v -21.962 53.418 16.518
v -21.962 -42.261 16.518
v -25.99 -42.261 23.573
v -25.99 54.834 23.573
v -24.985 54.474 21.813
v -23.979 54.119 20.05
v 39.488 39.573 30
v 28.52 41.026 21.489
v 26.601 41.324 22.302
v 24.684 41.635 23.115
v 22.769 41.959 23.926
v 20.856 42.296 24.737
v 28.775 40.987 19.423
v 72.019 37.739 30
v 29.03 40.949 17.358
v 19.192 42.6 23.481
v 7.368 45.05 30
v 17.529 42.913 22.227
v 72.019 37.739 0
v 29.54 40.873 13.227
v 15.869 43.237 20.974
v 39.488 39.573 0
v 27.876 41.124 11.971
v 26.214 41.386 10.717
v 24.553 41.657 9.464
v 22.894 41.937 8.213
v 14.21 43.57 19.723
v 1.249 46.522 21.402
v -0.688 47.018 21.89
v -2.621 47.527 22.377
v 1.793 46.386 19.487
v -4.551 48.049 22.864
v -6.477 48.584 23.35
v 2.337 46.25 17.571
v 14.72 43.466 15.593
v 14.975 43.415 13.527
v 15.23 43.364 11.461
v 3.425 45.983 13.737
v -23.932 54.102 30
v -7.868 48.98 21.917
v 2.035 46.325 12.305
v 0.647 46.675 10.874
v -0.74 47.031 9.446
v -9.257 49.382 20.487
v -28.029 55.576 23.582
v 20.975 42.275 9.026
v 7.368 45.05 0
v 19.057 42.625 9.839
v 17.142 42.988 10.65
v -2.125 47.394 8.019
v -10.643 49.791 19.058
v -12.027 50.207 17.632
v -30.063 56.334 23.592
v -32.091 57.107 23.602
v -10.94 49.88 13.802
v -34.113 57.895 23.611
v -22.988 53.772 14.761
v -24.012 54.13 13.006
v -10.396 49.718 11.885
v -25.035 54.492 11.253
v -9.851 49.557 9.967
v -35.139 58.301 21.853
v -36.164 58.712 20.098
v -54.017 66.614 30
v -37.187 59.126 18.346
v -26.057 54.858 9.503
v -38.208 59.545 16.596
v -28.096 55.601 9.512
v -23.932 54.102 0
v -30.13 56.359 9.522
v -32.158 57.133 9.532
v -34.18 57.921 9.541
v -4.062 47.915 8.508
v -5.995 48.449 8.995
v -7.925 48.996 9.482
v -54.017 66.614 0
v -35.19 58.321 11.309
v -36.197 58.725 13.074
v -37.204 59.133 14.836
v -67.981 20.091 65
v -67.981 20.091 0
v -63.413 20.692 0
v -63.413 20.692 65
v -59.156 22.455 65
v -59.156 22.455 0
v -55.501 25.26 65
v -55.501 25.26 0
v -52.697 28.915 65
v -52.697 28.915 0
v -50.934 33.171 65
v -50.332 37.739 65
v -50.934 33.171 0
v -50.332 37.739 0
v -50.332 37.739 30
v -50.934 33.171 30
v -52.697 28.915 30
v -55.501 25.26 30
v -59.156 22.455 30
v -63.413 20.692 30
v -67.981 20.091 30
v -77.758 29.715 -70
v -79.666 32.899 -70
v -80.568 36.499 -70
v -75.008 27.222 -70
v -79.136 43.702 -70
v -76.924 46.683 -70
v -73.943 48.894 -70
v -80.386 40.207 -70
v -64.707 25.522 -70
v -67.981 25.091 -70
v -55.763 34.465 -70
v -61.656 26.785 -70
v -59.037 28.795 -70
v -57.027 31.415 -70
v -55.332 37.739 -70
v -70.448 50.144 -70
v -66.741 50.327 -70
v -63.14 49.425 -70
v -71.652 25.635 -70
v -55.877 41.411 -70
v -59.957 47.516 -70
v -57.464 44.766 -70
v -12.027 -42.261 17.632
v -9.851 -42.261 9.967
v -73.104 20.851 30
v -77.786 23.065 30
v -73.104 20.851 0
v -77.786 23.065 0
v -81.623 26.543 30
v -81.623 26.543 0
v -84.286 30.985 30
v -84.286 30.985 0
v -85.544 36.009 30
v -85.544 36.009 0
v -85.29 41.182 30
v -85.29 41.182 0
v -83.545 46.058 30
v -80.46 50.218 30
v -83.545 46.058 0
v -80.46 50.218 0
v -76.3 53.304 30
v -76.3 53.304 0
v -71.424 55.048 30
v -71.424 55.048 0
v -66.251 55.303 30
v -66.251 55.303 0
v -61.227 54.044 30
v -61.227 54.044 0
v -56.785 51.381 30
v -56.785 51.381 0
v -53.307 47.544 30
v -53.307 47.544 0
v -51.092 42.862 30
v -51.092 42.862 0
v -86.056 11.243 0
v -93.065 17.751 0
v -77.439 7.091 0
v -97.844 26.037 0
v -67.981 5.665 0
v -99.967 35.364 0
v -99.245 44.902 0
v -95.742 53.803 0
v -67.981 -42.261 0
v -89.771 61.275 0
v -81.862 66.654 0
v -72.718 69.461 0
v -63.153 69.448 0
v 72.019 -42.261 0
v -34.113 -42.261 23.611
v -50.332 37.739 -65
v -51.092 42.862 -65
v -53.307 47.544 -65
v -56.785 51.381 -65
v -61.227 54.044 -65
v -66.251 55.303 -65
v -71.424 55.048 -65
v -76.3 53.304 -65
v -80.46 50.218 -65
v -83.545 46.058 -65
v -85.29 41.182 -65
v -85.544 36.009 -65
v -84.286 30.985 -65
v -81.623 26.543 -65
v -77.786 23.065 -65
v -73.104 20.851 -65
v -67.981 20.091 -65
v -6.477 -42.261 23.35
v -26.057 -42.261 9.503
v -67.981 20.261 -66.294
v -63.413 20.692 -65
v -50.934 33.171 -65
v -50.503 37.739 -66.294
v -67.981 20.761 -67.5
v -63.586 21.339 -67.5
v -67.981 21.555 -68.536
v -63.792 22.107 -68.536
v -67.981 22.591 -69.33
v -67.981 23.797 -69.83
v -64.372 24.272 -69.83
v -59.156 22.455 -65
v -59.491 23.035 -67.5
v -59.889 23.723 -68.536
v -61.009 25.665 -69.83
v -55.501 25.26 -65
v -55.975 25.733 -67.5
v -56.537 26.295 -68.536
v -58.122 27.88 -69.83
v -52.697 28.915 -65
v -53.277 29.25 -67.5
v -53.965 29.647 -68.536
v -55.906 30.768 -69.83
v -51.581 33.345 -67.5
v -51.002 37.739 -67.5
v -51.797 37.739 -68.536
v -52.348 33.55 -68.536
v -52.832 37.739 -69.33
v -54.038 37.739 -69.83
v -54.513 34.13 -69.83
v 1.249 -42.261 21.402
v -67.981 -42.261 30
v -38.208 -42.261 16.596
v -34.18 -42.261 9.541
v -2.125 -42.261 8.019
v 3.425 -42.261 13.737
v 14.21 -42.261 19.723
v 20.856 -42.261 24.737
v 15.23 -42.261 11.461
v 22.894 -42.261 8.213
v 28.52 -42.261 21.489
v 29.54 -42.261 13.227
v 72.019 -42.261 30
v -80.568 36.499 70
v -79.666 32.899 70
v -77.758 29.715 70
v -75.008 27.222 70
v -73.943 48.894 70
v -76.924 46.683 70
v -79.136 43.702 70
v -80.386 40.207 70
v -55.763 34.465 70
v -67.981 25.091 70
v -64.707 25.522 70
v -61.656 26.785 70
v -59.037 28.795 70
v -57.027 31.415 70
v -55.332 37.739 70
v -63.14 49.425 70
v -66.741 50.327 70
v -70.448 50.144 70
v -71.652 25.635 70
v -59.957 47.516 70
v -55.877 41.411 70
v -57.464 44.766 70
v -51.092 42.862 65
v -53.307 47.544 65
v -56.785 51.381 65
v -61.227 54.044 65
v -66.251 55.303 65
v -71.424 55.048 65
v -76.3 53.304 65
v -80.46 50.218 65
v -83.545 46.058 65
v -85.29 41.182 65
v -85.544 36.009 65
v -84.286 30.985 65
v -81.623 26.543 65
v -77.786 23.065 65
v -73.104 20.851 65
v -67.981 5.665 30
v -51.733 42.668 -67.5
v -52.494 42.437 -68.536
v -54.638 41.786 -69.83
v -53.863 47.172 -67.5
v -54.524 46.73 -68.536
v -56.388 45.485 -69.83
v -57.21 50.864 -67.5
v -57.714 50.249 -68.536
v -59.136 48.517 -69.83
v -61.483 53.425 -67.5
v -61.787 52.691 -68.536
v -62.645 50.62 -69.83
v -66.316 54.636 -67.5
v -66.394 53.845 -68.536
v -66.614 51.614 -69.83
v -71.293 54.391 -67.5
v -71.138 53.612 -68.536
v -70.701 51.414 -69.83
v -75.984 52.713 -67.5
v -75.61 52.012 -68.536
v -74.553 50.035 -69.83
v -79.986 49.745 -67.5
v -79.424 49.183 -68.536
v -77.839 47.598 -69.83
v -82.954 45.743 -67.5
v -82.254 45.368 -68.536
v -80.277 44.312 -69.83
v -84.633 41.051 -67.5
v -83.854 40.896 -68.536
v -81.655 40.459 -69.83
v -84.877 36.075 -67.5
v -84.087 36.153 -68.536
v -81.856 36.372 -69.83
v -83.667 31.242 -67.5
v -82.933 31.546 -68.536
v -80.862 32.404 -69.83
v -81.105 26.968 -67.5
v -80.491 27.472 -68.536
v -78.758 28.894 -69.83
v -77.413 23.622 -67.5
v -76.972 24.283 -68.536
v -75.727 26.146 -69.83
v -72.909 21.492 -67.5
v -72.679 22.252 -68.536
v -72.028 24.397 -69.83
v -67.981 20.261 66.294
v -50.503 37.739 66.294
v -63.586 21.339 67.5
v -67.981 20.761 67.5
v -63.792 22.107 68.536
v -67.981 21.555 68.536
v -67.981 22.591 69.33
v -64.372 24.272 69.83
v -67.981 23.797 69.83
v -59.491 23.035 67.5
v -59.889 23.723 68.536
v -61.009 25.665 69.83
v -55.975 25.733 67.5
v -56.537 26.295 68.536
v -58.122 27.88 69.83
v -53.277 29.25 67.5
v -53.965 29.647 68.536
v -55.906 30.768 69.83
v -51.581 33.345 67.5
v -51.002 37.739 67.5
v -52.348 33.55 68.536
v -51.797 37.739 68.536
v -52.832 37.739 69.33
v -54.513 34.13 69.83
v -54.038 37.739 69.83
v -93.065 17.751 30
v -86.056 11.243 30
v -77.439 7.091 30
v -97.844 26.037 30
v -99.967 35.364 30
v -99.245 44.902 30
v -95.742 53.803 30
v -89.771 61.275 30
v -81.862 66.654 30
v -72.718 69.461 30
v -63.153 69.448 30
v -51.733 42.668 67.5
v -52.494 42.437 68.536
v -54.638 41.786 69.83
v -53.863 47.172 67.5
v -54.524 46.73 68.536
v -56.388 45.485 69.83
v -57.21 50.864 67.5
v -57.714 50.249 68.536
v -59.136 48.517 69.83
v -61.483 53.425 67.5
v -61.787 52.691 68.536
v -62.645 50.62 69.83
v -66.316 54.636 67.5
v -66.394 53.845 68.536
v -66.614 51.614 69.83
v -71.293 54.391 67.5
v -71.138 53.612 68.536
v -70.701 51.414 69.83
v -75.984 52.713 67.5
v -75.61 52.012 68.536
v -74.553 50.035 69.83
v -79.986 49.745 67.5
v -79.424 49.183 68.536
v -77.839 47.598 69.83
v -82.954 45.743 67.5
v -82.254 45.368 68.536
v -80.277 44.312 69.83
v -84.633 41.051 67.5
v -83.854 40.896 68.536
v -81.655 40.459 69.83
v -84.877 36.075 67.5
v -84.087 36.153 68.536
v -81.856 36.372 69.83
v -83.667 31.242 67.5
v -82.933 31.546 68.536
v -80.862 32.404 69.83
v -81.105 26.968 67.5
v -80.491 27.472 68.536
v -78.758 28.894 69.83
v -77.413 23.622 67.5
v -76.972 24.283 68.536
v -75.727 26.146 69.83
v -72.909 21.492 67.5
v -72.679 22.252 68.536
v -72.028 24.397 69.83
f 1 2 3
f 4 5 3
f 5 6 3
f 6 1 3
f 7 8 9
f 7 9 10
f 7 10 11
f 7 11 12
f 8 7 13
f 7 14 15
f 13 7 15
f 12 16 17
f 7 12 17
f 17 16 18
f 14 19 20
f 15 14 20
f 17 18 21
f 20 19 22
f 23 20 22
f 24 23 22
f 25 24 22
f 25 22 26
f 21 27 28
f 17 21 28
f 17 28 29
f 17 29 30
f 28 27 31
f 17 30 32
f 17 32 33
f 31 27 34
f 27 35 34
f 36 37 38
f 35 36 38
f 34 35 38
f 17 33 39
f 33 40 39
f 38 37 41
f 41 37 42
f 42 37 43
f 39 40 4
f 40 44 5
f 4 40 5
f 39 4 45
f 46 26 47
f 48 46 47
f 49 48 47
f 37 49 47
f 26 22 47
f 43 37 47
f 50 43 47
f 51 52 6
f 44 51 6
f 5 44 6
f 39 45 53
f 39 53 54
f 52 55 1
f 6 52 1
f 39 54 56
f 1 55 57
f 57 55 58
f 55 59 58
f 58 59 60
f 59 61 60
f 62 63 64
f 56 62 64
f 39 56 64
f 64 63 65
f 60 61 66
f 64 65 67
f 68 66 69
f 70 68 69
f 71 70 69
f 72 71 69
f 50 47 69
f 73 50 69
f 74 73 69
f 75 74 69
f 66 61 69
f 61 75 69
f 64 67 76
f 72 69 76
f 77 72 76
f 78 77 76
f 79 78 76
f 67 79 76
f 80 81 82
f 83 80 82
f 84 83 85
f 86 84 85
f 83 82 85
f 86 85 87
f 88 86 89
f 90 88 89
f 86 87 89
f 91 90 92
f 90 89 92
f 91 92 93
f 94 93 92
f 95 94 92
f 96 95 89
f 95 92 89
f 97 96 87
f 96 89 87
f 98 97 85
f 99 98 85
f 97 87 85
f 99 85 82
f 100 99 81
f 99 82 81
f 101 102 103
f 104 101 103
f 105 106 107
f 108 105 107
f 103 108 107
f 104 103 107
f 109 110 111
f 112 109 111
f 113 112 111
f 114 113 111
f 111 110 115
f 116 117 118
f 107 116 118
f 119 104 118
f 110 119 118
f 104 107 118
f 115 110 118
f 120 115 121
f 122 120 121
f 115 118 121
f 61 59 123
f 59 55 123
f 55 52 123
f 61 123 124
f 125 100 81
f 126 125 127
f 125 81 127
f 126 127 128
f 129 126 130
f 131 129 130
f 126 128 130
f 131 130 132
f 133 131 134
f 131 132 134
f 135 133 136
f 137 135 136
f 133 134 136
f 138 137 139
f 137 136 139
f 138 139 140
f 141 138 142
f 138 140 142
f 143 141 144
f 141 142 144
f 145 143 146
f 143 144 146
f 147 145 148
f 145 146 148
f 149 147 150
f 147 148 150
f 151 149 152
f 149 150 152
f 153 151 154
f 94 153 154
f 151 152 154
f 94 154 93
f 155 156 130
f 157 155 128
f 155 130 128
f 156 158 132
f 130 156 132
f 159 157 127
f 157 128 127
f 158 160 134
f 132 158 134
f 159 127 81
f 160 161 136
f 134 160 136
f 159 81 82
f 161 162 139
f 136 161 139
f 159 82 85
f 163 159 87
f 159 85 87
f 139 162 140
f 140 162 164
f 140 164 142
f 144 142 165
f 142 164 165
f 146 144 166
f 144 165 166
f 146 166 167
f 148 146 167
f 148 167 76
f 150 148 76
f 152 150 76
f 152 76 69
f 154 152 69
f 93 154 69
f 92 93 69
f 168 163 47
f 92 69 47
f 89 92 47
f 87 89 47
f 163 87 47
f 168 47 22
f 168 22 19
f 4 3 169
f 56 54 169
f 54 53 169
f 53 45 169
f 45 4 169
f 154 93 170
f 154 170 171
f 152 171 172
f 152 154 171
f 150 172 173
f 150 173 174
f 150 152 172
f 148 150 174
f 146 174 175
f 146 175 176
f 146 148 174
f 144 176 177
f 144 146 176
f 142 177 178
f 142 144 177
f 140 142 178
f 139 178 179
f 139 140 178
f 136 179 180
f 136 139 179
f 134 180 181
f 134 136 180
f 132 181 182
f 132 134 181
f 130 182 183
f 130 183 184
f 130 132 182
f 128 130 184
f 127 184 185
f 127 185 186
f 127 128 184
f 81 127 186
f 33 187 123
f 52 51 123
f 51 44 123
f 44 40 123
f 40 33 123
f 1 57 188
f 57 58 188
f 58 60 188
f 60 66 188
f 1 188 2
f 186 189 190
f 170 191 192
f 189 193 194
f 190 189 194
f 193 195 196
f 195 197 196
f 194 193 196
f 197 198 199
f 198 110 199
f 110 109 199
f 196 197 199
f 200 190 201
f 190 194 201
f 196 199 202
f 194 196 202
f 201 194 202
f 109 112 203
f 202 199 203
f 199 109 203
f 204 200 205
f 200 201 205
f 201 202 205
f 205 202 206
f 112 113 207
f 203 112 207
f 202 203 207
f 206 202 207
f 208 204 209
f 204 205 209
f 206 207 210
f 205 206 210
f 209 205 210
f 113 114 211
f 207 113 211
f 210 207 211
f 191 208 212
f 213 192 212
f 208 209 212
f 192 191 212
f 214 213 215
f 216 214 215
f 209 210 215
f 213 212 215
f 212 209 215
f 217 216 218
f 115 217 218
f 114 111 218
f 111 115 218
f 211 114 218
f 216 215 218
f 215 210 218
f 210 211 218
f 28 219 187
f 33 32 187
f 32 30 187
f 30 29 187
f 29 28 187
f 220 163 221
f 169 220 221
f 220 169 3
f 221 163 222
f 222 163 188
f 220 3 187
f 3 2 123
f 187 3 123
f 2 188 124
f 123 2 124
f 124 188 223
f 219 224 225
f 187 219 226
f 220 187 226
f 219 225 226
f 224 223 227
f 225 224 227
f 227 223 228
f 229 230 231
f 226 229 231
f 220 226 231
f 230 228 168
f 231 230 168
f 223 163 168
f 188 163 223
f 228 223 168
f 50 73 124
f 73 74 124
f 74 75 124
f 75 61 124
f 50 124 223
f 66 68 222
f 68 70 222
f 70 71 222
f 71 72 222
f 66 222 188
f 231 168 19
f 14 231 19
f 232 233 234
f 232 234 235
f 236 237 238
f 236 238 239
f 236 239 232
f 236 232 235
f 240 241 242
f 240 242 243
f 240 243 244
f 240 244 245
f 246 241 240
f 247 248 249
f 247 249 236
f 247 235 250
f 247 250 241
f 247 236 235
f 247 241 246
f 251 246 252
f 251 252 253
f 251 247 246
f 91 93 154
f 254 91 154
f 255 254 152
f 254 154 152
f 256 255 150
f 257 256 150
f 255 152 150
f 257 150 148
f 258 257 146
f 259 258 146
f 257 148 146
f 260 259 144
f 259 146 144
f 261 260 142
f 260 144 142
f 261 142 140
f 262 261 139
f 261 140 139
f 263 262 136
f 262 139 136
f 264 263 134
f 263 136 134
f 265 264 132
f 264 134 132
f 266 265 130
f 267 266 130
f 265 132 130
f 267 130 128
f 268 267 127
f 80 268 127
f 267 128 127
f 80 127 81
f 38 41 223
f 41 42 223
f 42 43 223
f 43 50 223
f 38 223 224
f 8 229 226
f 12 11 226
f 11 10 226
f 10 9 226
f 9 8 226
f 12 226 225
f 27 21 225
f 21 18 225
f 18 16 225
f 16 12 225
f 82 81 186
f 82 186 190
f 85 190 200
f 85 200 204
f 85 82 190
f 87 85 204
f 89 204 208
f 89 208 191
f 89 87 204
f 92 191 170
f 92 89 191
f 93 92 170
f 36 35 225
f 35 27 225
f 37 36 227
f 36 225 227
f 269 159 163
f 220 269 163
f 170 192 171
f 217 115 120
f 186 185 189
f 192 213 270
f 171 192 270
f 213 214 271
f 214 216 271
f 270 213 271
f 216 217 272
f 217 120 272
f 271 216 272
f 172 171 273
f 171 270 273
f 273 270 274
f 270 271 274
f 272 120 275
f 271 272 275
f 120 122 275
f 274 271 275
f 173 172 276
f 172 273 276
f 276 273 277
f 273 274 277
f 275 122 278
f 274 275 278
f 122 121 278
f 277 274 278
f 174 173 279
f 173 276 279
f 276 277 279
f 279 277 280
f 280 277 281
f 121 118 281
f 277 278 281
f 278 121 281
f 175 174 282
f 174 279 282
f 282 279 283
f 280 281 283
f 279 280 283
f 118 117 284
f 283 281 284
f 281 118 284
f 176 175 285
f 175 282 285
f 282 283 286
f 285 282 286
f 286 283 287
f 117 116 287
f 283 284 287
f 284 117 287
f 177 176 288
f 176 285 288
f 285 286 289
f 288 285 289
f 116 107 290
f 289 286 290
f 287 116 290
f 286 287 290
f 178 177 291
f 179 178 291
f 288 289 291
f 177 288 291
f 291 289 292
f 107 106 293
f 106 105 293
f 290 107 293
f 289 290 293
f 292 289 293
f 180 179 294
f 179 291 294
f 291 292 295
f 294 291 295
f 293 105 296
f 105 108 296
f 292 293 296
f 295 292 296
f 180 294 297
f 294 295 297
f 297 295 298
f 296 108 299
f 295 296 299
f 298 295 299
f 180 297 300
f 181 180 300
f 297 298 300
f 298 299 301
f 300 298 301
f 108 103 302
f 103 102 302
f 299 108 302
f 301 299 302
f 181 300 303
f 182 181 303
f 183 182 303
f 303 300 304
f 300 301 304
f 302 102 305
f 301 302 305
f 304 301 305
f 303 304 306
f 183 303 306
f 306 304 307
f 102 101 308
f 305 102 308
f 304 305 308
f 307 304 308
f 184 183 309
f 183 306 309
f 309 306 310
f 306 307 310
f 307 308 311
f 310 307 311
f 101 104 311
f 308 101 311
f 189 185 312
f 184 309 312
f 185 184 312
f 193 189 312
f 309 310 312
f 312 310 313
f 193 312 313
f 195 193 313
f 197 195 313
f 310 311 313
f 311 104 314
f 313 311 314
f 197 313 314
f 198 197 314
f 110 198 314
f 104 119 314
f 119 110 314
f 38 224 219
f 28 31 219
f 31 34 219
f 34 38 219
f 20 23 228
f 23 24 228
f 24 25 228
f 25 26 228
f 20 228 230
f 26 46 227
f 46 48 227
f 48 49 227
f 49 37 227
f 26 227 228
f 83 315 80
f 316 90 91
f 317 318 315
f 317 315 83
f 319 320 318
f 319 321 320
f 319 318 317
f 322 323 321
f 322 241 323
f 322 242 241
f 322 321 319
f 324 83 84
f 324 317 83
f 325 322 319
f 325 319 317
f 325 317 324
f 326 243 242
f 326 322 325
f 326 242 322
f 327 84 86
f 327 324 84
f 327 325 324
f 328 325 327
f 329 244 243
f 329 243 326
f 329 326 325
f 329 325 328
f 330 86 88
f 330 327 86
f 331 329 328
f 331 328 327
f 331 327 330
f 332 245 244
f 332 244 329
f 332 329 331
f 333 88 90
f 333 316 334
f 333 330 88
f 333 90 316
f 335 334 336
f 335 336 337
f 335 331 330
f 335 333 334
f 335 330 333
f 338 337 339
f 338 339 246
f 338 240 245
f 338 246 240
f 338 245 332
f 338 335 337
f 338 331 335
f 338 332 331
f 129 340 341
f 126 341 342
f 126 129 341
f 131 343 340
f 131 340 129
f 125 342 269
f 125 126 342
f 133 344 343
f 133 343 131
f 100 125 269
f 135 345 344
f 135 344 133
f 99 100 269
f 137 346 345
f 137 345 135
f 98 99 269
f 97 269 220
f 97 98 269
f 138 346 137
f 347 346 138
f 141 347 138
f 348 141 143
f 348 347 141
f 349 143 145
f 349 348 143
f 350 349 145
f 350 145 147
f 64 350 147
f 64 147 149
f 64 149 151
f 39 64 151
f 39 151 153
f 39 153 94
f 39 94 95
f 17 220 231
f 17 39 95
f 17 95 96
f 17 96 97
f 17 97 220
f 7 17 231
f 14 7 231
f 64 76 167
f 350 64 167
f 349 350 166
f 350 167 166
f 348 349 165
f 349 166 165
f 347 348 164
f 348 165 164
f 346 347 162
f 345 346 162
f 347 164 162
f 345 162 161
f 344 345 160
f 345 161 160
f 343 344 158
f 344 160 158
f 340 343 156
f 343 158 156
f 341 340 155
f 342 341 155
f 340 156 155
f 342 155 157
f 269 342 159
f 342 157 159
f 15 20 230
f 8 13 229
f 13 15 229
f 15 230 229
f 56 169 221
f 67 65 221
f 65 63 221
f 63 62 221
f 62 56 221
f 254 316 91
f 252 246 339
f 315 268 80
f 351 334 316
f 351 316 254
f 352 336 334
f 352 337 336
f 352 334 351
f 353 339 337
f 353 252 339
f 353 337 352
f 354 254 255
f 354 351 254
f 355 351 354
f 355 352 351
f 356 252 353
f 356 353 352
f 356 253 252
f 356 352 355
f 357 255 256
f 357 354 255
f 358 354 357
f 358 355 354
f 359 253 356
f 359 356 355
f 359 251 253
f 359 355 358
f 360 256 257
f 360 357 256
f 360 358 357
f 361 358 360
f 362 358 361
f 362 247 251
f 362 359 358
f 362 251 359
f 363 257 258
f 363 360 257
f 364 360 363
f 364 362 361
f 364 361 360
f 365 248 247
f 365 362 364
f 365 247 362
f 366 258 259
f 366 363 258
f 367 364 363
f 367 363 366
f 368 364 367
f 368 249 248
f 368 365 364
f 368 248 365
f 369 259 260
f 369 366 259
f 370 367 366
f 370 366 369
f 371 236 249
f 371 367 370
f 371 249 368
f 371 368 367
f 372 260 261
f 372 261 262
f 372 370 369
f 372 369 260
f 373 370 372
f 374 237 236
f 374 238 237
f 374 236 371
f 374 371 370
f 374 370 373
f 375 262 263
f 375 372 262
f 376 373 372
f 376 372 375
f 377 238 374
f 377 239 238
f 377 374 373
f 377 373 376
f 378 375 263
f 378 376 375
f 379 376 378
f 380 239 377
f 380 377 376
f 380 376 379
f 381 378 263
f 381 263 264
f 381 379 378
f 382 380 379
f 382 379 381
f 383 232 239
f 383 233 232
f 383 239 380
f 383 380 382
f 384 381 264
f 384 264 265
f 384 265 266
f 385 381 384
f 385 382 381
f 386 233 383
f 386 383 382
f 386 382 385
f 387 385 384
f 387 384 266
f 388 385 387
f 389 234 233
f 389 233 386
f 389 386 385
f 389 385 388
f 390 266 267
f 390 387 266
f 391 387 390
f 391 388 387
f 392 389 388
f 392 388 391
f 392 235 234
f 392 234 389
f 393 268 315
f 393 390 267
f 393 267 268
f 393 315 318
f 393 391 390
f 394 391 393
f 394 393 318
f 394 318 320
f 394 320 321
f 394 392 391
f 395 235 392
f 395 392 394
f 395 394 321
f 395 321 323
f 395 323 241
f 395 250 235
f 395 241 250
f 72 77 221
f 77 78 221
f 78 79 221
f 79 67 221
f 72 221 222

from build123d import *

# Parameters (mm, degrees)
F1_DEPTH = 30
F2_DEPTH = 70
F4_DEPTH = 200
F5_R     = 5


with BuildPart() as f1:
    # F0 (on Top) → F1 (new body)
    with BuildSketch(Plane.XY):
        with BuildLine():
            ThreePointArc((-67.980623506, 20.0906718244), (-80.4599364374, 50.2183983524), (-50.3322099094, 37.739085421))
            Line((-50.3322099094, 37.739085421), (-35.9065500107, 37.739085421))
            ThreePointArc((-35.9065500107, 37.739085421), (-40.8088399907, 54.7813966252), (-54.0171508499, 66.6141200005))
            ThreePointArc((-54.0171508499, 66.6141200005), (-99.2447097062, 44.9017039821), (-67.980623506, 5.6650119258))
            Line((-67.980623506, 5.6650119258), (-67.980623506, 20.0906718244))
        make_face()
        with BuildLine():
            ThreePointArc((-54.0171508499, 66.6141200005), (-40.8088399907, 54.7813966252), (-35.9065500107, 37.739085421))
            Line((-35.9065500107, 37.739085421), (72.019376494, 37.739085421))
            ThreePointArc((72.019376494, 37.739085421), (7.3684409887, 45.0501597065), (-54.0171508499, 66.6141200005))
        make_face()
        with BuildLine():
            Line((72.019376494, 37.739085421), (-35.9065500107, 37.739085421))
            ThreePointArc((-35.9065500107, 37.739085421), (-45.3008286372, 15.0592905522), (-67.980623506, 5.6650119258))
            Line((-67.980623506, 5.6650119258), (-67.980623506, -42.260914579))
            Line((-67.980623506, -42.260914579), (72.019376494, -42.260914579))
            Line((72.019376494, -42.260914579), (72.019376494, 37.739085421))
        make_face()
        with BuildLine():
            Line((-35.9065500107, 37.739085421), (-50.3322099094, 37.739085421))
            ThreePointArc((-50.3322099094, 37.739085421), (-55.5013105746, 25.2597724897), (-67.980623506, 20.0906718244))
            Line((-67.980623506, 20.0906718244), (-67.980623506, 5.6650119258))
            ThreePointArc((-67.980623506, 5.6650119258), (-45.3008286372, 15.0592905522), (-35.9065500107, 37.739085421))
        make_face()
    extrude(amount=F1_DEPTH)

    # F3 (on face) → F4 (cut)
    with BuildSketch(Plane.XZ.offset(42.260914579)):
        Polygon((-26.0570636989, 9.5027446255), (-21.9619207977, 16.518346642), (-25.9900389162, 23.5726454348), (-34.1132999359, 23.6113422111), (-38.2084428371, 16.5957401946), (-34.1803247186, 9.5414414018), align=None)
        Polygon((1.2488726703, 21.4017832862), (-6.4774776311, 23.3495750756), (-12.0274899527, 17.6322553307), (-9.8511519729, 9.9671437964), (-2.1248016714, 8.019352007), (3.4252106502, 13.7366717519), align=None)
        Polygon((22.8943165159, 8.212744078), (29.5398056635, 13.2265329518), (28.5204817034, 21.4885898111), (20.8556685957, 24.7368577965), (14.2101794481, 19.7230689228), (15.2295034082, 11.4610120635), align=None)
    extrude(amount=-F4_DEPTH, mode=Mode.SUBTRACT)


with BuildPart() as f2:
    # F0 (on Top) → F2 (new body, symmetric)
    with BuildSketch(Plane.XY):
        with BuildLine():
            Line((-50.3322099094, 37.739085421), (-67.980623506, 37.739085421))
            Line((-67.980623506, 37.739085421), (-67.980623506, 20.0906718244))
            ThreePointArc((-67.980623506, 20.0906718244), (-55.5013105746, 25.2597724897), (-50.3322099094, 37.739085421))
        make_face()
        with BuildLine():
            Line((-67.980623506, 20.0906718244), (-67.980623506, 37.739085421))
            Line((-67.980623506, 37.739085421), (-50.3322099094, 37.739085421))
            ThreePointArc((-50.3322099094, 37.739085421), (-80.4599364374, 50.2183983524), (-67.980623506, 20.0906718244))
        make_face()
    extrude(amount=F2_DEPTH, both=True)

    # F5
    f5_edges = [f2.edges().sort_by_distance(p)[0] for p in [
        (-85.629037, 37.739085, -70),
        (-50.33221, 37.739085, 0),
        (-85.629037, 37.739085, 70),
    ]]
    fillet(f5_edges, radius=F5_R)


solid = Compound([f1.part, f2.part])
